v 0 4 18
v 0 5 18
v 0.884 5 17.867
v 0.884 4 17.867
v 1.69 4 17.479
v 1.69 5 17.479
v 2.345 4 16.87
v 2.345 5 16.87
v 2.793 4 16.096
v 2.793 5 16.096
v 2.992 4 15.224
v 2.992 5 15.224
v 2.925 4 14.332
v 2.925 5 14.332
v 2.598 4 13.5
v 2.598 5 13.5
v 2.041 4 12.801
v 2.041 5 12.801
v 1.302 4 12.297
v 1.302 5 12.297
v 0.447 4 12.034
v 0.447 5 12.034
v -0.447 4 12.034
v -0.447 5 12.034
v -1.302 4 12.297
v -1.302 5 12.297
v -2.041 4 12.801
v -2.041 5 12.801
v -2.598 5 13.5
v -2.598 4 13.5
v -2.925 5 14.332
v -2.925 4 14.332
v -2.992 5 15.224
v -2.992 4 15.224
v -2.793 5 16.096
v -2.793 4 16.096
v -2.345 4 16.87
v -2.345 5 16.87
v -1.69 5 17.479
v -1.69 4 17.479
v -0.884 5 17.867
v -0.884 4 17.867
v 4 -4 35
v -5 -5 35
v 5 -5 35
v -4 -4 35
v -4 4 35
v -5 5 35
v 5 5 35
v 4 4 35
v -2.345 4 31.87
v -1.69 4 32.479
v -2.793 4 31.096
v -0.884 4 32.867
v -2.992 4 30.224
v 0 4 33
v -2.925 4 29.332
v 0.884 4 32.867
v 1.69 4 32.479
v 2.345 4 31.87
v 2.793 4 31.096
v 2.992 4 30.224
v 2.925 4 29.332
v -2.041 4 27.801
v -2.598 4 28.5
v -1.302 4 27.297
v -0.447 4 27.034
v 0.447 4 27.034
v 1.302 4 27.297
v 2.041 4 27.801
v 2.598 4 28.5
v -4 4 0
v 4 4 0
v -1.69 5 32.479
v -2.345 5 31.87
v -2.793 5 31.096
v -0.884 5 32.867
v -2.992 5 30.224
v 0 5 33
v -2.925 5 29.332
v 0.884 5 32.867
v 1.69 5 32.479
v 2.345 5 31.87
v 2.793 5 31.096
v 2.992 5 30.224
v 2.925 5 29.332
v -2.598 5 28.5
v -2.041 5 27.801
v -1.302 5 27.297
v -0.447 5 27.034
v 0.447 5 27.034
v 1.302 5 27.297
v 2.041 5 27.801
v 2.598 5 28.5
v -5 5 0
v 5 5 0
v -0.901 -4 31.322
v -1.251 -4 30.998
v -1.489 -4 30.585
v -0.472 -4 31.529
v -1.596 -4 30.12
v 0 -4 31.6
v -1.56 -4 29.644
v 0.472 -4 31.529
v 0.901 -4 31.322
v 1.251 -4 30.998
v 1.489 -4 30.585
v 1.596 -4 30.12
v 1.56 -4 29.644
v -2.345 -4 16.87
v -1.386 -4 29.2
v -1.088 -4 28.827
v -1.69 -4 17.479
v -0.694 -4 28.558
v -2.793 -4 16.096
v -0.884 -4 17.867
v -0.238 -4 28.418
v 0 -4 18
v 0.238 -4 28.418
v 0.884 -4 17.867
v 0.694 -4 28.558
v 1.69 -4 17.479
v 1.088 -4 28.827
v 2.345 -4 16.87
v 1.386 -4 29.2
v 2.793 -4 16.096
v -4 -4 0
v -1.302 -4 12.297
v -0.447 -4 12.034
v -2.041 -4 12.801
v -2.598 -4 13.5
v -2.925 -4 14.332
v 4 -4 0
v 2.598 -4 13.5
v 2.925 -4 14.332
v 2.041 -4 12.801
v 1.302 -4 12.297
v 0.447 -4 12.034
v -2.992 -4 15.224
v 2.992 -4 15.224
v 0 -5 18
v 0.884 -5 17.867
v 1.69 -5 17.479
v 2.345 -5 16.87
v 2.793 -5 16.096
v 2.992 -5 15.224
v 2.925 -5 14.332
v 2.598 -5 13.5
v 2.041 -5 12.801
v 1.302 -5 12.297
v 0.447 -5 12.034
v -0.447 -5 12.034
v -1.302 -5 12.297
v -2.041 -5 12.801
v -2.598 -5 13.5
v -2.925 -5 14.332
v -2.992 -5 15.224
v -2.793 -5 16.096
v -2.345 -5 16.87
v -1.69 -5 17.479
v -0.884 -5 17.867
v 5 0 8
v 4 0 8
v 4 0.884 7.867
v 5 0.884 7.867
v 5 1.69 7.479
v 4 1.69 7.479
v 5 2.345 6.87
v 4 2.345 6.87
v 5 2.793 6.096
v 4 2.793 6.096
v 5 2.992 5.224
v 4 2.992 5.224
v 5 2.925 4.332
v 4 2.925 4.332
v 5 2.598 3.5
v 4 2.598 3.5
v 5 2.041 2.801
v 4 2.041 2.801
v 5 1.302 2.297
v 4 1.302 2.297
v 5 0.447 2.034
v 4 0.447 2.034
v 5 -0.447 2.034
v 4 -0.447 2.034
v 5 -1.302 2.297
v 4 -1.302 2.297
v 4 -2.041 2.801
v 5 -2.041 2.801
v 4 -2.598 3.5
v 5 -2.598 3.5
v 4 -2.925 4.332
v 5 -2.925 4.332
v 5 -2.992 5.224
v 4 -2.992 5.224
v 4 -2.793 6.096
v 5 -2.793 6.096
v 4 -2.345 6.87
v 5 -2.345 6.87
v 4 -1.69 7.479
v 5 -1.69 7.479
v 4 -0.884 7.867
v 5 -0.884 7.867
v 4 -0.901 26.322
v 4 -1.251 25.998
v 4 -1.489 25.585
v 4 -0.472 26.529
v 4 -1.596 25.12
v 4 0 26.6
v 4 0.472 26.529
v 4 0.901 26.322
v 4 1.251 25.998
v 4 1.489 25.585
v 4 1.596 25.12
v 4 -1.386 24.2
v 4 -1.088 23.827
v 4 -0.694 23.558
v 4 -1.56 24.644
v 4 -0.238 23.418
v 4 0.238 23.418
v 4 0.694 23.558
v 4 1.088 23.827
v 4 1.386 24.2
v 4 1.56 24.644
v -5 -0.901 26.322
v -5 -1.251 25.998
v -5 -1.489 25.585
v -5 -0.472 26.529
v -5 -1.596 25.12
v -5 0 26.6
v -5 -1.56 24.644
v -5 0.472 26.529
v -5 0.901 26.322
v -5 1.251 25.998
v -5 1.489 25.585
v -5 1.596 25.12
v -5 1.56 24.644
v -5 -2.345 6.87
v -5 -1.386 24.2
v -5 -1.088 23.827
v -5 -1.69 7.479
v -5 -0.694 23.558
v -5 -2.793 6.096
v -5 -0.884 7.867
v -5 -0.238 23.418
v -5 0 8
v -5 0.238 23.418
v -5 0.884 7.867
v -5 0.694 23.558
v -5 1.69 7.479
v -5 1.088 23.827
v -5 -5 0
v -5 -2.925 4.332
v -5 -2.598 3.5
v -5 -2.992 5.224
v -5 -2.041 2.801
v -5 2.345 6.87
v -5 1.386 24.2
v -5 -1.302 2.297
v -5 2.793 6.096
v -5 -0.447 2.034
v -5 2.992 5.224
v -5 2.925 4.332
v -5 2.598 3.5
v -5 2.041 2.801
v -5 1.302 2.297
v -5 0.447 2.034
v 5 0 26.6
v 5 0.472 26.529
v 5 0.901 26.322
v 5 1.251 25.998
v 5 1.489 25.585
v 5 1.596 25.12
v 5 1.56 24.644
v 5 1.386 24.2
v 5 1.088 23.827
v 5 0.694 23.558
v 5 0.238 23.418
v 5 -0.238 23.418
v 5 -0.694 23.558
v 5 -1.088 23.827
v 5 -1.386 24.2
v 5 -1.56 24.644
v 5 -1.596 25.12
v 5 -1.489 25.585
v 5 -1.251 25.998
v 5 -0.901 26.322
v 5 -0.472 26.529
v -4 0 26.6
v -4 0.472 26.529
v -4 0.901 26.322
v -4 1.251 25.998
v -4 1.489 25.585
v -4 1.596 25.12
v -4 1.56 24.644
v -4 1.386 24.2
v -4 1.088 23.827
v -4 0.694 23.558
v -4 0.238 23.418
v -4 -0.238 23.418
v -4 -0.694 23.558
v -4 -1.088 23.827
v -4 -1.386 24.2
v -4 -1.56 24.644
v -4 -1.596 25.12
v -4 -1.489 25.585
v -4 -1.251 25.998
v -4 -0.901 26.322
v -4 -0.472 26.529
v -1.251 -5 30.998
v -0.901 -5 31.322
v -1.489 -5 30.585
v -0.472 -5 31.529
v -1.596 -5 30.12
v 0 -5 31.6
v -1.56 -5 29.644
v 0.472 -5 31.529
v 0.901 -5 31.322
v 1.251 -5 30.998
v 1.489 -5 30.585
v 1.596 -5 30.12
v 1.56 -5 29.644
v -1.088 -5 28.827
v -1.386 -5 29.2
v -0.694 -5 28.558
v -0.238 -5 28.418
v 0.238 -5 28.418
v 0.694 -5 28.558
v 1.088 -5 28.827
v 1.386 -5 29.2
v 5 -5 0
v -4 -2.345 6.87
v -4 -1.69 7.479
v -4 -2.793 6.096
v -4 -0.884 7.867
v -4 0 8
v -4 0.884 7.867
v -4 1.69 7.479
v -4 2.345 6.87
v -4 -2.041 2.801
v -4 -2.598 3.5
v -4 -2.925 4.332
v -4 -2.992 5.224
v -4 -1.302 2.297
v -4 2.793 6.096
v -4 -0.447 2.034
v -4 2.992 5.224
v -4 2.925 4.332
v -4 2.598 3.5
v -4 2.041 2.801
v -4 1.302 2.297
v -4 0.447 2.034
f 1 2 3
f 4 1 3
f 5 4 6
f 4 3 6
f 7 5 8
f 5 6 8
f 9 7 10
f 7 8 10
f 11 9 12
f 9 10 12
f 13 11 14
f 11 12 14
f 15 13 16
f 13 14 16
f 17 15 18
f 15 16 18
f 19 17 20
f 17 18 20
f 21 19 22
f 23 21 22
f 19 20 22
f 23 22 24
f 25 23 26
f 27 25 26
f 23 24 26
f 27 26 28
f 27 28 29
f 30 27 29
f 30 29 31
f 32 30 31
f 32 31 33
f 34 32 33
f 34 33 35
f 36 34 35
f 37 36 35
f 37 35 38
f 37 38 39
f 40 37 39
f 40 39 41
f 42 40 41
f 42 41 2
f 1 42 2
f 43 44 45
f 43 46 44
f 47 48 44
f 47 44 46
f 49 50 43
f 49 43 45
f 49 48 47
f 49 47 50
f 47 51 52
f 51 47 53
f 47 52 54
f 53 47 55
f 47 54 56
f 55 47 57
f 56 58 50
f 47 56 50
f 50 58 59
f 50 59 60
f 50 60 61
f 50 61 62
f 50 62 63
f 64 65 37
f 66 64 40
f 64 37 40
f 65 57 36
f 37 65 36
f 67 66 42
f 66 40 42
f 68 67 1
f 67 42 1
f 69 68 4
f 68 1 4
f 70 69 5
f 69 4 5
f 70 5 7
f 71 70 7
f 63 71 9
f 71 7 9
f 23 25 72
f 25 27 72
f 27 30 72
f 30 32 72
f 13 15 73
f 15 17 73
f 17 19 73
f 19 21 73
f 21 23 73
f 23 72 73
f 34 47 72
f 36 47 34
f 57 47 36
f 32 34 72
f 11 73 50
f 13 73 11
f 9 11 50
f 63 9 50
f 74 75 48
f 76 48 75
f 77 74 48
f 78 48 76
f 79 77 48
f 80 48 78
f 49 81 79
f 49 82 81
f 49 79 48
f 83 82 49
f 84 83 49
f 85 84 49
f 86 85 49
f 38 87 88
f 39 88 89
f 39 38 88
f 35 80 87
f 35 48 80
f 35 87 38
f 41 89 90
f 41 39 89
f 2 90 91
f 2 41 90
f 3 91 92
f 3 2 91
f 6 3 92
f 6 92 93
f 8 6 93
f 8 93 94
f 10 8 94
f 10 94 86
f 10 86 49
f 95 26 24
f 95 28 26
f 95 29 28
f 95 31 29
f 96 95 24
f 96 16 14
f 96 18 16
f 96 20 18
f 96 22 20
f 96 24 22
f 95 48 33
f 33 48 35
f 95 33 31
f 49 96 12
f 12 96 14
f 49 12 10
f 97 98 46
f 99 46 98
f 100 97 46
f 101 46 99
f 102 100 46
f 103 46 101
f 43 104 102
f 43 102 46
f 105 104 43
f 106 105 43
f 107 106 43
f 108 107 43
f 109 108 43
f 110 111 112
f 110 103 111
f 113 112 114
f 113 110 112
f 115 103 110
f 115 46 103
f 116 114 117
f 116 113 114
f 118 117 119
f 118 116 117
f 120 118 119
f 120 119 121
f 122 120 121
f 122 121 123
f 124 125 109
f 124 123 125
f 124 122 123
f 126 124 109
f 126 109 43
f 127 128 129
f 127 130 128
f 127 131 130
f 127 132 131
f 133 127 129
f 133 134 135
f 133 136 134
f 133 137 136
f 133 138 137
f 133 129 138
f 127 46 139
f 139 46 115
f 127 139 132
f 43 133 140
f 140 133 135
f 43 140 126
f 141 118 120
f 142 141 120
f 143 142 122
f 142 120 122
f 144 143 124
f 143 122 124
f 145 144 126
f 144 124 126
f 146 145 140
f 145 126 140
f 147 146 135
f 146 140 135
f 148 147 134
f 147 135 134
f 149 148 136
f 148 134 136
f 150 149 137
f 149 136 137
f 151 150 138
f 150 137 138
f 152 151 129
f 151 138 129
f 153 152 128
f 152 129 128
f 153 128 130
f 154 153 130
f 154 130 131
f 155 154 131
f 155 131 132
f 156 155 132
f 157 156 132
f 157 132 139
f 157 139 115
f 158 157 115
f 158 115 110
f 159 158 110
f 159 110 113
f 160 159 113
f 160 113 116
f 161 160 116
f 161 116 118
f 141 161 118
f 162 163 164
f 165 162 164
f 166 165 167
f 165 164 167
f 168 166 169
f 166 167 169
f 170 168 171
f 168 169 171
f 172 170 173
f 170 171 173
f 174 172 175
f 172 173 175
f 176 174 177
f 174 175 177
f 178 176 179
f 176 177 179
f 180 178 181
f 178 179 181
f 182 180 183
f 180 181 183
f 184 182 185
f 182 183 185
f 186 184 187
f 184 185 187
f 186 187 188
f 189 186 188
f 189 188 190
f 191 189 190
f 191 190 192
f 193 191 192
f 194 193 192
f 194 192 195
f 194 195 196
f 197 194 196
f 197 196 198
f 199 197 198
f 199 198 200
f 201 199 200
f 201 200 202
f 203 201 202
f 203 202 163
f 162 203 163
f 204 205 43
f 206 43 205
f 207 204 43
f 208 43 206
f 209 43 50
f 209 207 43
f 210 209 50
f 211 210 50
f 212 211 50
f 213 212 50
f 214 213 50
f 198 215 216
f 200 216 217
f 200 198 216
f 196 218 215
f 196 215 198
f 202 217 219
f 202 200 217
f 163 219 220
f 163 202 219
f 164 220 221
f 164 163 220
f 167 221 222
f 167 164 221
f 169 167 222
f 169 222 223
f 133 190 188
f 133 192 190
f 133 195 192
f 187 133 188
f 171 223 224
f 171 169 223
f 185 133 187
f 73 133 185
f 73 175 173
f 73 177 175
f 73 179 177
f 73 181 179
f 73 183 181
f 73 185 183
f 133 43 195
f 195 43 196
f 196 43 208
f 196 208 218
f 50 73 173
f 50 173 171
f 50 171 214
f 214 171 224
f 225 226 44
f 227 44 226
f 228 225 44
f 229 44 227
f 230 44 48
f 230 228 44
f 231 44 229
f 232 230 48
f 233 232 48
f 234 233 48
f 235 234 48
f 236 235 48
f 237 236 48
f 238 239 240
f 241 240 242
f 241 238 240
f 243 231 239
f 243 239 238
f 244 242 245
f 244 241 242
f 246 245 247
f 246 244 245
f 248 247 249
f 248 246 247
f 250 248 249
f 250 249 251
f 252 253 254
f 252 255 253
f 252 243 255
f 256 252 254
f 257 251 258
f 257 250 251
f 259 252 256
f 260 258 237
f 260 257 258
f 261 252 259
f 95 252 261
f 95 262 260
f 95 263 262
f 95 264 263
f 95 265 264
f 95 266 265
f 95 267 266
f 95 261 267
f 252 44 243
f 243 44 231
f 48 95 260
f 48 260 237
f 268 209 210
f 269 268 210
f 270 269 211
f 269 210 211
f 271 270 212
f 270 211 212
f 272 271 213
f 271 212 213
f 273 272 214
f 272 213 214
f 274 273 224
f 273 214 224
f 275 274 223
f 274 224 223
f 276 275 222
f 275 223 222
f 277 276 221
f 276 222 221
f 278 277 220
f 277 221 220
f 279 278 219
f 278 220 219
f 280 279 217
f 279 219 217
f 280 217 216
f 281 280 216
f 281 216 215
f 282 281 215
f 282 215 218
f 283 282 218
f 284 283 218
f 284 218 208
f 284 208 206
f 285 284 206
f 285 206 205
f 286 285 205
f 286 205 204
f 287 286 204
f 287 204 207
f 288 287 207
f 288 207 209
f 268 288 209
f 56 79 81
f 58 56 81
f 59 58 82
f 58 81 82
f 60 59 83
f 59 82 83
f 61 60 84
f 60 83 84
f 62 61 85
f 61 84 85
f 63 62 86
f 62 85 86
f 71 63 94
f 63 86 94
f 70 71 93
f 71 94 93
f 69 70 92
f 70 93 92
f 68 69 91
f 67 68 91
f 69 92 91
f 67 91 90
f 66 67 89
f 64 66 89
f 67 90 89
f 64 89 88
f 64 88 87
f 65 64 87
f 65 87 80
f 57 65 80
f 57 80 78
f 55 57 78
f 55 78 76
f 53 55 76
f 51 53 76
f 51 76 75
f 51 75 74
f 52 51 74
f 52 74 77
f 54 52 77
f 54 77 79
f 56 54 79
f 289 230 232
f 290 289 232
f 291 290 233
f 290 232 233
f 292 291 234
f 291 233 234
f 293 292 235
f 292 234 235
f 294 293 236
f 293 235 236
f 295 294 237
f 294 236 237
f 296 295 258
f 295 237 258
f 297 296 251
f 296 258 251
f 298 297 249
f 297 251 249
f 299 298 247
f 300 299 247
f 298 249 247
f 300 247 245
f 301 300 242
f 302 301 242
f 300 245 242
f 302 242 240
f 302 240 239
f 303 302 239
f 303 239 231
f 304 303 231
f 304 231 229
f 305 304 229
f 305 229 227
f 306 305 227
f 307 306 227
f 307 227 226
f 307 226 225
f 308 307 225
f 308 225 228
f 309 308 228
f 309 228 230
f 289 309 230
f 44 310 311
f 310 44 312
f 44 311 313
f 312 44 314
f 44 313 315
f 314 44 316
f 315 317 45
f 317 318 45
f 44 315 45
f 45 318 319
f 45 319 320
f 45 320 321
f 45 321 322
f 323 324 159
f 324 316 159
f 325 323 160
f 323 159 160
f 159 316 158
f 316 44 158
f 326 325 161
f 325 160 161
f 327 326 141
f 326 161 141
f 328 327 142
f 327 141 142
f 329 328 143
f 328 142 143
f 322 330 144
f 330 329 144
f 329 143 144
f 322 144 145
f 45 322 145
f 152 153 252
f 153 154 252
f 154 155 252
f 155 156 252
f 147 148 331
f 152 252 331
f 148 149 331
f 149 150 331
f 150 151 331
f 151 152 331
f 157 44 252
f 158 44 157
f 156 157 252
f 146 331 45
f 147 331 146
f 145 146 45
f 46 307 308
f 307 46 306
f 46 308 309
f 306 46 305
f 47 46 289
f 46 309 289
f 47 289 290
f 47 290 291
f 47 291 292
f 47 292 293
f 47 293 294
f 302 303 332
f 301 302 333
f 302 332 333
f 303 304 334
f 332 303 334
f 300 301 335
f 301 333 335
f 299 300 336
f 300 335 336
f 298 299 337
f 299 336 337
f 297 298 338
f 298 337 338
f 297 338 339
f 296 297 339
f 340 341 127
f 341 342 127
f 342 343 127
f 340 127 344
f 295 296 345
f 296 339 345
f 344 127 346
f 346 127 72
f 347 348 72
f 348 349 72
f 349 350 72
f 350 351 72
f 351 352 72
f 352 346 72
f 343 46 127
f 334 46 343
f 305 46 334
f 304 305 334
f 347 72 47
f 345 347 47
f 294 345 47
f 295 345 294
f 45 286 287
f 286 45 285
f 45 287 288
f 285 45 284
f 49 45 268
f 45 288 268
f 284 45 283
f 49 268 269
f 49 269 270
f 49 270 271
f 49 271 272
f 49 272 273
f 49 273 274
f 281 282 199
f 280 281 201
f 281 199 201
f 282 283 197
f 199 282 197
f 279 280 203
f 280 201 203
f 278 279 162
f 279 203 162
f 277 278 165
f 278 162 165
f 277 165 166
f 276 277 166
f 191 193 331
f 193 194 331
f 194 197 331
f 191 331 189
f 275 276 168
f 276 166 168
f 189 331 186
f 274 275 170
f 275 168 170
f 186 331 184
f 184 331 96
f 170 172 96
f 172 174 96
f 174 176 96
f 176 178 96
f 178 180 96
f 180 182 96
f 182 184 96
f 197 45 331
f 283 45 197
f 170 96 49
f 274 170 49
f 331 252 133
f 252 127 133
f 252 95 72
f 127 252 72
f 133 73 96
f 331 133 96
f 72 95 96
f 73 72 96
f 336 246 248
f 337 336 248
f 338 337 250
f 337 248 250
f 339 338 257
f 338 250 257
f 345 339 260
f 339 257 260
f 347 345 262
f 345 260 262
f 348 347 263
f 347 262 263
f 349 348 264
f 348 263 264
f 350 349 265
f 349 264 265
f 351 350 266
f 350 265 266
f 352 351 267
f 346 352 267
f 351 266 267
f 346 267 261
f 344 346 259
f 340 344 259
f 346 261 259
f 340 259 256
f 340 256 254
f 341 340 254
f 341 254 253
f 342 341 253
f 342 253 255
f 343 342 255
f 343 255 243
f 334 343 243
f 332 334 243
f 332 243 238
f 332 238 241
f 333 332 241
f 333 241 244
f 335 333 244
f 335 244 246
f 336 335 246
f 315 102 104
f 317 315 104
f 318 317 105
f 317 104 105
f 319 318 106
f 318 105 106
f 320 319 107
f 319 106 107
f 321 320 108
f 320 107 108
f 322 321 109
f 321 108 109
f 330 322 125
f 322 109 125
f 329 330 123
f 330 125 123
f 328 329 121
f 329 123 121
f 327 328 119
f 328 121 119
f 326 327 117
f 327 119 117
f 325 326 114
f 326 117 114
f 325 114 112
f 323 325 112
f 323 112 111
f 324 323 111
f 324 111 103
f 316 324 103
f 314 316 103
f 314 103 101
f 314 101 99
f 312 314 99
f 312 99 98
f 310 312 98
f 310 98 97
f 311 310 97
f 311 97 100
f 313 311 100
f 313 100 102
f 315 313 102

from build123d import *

# Parameters (mm, degrees)
SKETCH_1_W          = 10
SKETCH_1_H          = 10
SKETCH_1_W_2        = 8
SKETCH_1_H_2        = 8
EXTRUDE_1_DEPTH     = 80
SKETCH_2_R          = 3
CUT_EXTRUDE_1_DEPTH = 81.777472107
SKETCH_3_R          = 3
CUT_EXTRUDE_2_DEPTH = 10
SKETCH_4_R          = 1.6
CUT_EXTRUDE_3_DEPTH = 10
SKETCH_5_R          = 1.6
CUT_EXTRUDE_4_DEPTH = 81.777472107
SKETCH_6_W          = 10
SKETCH_6_H          = 45
CUT_EXTRUDE_5_DEPTH = 10
SKETCH_7_R          = 3
CUT_EXTRUDE_6_DEPTH = 2


with BuildPart() as part:
    # ｽｹｯﾁ1 → ﾎﾞｽ - 押し出し1 (new body)
    with BuildSketch(Plane.XY):
        Rectangle(SKETCH_1_W, SKETCH_1_H)
        Rectangle(SKETCH_1_W_2, SKETCH_1_H_2, mode=Mode.SUBTRACT)
    extrude(amount=EXTRUDE_1_DEPTH)

    # ｽｹｯﾁ2 → ｶｯﾄ - 押し出し1 (cut, through all)
    with BuildSketch(Plane.ZY.offset(5)):
        with Locations((5, 0)):
            Circle(SKETCH_2_R)
        with Locations((75, 0)):
            Circle(SKETCH_2_R)
    extrude(amount=-CUT_EXTRUDE_1_DEPTH, mode=Mode.SUBTRACT)

    # ｽｹｯﾁ3 → ｶｯﾄ - 押し出し2 (cut)
    with BuildSketch(Plane(origin=(0, 5, 0), x_dir=(1, 0, 0), z_dir=(0, 1, 0))):
        with Locations(Location((0, -65, 0), (0, 0, 270))):
            Circle(SKETCH_3_R)
        with Locations(Location((0, -15, 0), (0, 0, 270))):
            Circle(SKETCH_3_R)
    extrude(amount=-CUT_EXTRUDE_2_DEPTH, mode=Mode.SUBTRACT)

    # ｽｹｯﾁ4 → ｶｯﾄ - 押し出し3 (cut)
    with BuildSketch(Plane(origin=(0, 5, 0), x_dir=(1, 0, 0), z_dir=(0, 1, 0))):
        with Locations(Location((0, -30, 0), (0, 0, 270))):
            Circle(SKETCH_4_R)
        with Locations(Location((0, -50, 0), (0, 0, 270))):
            Circle(SKETCH_4_R)
    extrude(amount=-CUT_EXTRUDE_3_DEPTH, mode=Mode.SUBTRACT)

    # ｽｹｯﾁ5 → ｶｯﾄ - 押し出し4 (cut, through all)
    with BuildSketch(Plane.ZY.offset(5)):
        with Locations((25, 0)):
            Circle(SKETCH_5_R)
        with Locations((55, 0)):
            Circle(SKETCH_5_R)
    extrude(amount=-CUT_EXTRUDE_4_DEPTH, mode=Mode.SUBTRACT)

    # ｽｹｯﾁ6 → ｶｯﾄ - 押し出し5 (cut)
    with BuildSketch(Plane(origin=(0, 5, 0), x_dir=(1, 0, 0), z_dir=(0, 1, 0))):
        with Locations((0, -57.5)):
            Rectangle(SKETCH_6_W, SKETCH_6_H)
    extrude(amount=-CUT_EXTRUDE_5_DEPTH, mode=Mode.SUBTRACT)

    # ｽｹｯﾁ7 → ｶｯﾄ - 押し出し6 (cut)
    with BuildSketch(Plane(origin=(0, 5, 0), x_dir=(1, 0, 0), z_dir=(0, 1, 0))):
        with Locations(Location((0, -30, 0), (0, 0, 270))):
            Circle(SKETCH_7_R)
    extrude(amount=-CUT_EXTRUDE_6_DEPTH, mode=Mode.SUBTRACT)


solid = part.part
